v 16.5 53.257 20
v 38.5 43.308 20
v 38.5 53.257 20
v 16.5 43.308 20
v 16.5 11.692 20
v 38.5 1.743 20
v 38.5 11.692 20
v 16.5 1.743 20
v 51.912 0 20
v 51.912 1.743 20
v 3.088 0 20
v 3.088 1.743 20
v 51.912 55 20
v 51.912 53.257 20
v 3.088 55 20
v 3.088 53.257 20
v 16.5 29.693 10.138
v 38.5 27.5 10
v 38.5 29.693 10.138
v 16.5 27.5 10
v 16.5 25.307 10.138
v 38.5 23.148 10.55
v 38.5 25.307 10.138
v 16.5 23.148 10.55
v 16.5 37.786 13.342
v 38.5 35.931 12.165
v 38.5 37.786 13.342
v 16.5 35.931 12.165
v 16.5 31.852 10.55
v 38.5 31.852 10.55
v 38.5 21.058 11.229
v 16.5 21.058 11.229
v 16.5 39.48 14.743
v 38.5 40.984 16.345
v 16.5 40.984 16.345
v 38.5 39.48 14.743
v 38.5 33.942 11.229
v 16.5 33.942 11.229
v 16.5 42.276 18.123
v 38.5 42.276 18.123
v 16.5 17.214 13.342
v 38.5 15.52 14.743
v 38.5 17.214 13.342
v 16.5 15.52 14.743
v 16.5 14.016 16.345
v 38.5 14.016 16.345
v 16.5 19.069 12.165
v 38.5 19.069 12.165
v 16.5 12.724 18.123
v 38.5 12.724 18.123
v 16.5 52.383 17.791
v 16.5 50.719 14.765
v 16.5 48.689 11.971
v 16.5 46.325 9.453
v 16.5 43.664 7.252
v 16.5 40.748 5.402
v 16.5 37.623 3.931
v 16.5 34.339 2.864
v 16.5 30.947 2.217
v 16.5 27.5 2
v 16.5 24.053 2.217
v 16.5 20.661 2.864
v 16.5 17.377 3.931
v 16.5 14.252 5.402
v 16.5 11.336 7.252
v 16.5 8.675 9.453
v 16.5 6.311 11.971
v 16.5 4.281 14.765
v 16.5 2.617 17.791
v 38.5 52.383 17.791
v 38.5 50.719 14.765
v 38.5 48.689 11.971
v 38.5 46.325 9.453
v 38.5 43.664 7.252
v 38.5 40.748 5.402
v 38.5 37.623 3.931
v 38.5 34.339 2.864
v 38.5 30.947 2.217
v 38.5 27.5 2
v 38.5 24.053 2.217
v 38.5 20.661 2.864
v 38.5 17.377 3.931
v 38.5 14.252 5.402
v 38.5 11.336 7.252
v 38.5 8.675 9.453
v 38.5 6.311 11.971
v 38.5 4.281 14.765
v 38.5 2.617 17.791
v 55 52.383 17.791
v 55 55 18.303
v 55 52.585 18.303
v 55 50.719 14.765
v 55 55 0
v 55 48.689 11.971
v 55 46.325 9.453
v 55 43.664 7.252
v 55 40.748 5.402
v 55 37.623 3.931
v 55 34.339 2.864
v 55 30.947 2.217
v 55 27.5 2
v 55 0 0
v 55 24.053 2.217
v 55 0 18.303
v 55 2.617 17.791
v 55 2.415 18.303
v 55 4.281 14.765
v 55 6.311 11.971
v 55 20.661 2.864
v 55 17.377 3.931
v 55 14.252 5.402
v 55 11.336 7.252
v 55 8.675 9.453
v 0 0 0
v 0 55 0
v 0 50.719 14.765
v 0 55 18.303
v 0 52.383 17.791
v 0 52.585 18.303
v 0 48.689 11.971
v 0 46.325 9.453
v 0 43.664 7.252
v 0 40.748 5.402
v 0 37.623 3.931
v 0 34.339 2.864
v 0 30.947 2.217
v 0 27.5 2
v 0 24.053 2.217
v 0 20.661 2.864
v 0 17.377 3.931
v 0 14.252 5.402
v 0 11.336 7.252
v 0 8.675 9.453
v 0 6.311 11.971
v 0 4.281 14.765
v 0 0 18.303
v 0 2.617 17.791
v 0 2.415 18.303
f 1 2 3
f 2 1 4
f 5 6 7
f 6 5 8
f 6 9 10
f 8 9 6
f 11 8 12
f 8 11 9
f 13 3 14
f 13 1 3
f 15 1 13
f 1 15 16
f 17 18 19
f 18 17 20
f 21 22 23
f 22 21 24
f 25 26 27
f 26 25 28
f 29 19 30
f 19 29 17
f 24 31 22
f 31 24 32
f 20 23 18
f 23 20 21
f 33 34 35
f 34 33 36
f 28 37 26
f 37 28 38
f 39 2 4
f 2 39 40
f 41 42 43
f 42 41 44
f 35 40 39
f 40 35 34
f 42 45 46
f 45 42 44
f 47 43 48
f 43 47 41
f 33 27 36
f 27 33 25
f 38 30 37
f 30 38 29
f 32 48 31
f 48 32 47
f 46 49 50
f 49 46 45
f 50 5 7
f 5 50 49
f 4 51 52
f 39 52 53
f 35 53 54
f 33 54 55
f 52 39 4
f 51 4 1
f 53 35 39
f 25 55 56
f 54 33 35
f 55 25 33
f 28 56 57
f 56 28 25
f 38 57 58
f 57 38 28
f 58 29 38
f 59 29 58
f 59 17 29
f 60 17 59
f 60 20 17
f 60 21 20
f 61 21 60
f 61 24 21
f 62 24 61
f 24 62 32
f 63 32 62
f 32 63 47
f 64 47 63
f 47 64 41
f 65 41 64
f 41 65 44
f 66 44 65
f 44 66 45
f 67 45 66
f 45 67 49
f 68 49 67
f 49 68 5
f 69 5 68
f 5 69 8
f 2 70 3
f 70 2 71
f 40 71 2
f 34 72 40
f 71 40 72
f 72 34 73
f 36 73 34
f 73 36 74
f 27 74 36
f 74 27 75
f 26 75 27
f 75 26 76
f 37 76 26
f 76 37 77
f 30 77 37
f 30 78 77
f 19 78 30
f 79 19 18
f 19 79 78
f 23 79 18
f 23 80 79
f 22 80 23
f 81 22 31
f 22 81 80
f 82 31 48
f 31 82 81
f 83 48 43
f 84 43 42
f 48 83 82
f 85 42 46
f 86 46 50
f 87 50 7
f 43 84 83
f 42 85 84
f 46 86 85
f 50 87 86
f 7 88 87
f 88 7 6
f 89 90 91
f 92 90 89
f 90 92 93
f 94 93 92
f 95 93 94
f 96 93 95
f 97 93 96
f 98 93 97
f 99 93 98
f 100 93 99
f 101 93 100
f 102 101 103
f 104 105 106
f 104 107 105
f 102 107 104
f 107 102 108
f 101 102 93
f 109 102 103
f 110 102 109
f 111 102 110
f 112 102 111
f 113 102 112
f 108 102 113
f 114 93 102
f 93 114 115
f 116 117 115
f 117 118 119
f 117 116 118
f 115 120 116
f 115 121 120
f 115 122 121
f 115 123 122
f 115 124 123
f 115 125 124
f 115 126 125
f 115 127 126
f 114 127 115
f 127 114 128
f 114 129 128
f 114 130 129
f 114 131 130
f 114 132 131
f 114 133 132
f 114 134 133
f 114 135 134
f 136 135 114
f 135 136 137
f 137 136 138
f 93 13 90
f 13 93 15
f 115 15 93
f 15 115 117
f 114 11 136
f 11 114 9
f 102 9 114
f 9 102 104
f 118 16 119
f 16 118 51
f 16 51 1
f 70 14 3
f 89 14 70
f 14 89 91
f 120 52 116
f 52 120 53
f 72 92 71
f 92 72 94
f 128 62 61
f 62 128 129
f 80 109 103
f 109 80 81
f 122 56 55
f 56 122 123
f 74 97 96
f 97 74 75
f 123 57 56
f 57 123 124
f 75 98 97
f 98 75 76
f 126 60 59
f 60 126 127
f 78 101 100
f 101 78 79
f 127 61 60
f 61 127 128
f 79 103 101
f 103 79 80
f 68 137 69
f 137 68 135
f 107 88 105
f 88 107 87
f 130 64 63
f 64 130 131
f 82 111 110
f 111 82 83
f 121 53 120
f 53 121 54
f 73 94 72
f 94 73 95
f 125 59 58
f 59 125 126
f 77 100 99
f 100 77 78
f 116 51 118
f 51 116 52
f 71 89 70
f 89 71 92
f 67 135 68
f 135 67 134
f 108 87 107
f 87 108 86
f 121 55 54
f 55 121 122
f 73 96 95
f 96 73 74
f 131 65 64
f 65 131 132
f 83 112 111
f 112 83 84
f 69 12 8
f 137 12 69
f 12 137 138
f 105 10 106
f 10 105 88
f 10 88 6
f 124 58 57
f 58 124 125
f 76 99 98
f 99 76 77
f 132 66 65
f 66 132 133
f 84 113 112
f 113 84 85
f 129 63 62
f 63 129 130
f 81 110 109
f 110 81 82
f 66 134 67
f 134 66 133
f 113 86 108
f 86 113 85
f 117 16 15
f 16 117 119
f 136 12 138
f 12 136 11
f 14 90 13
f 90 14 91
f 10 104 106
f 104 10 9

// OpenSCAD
////////////////////////////
// VARIABLES



/* [Wheel] */

//Wheel Diameter
wheelDiameter = 55;

wheelRadius = wheelDiameter/2;

//Thickness of Entire Wheel Structure
wheelThickness = 54;

//Space Between Wheels
wheelSpace = 22;


/* [Brake] */

//Height of Brake
boxHeight = 20;

boxThickness = wheelThickness+1;

//Brake Floor Thickness
boxBottomThickness = 2;

//Approx Groove Size for Inner Brace
innerBraceGroove = 35;


/* [Hidden] */
$fn=50;


////////////////////////////
// RENDER
intersection()
{
    //ROUNDED CORNER
    translate([boxThickness/2,wheelDiameter,-((wheelThickness+1)*(17/32))]) rotate([90,0,0]) cylinder(r=wheelThickness+1, h=wheelDiameter);
    
    union()
    {
        translate ([((wheelThickness+1)/2)-(wheelSpace/2),0,(wheelDiameter/2)])
        //INNER BRACE
        difference()
        {
            //BRACE
            translate([0,wheelDiameter/2,0]) rotate([0,90,0]) 
                cylinder(h=wheelSpace, d=wheelDiameter);
                        
            union()
            {
                //Brace Top Subtraction
                translate([-(wheelThickness/2) + (wheelSpace/2) ,0,boxHeight-(wheelRadius)]) 
                    cube([wheelThickness, wheelDiameter+1, wheelDiameter - boxHeight]);
                //Brace Groove Subtraction
                translate([-.1,wheelDiameter/2,0]) rotate([0,90,0]) cylinder(h=wheelSpace+1, d=innerBraceGroove);
             }
        }
        
        //MAIN BLOCK
        difference()
        {
        
            cube([boxThickness,wheelDiameter,boxHeight]);
            
            rotate([0,90,0])
             translate([-(wheelDiameter/2+boxBottomThickness),wheelDiameter/2,-.1])
         cylinder (h=wheelThickness+2, d=wheelDiameter);
            
            
        }
    }
}
////////////////////////////
// MODULES
